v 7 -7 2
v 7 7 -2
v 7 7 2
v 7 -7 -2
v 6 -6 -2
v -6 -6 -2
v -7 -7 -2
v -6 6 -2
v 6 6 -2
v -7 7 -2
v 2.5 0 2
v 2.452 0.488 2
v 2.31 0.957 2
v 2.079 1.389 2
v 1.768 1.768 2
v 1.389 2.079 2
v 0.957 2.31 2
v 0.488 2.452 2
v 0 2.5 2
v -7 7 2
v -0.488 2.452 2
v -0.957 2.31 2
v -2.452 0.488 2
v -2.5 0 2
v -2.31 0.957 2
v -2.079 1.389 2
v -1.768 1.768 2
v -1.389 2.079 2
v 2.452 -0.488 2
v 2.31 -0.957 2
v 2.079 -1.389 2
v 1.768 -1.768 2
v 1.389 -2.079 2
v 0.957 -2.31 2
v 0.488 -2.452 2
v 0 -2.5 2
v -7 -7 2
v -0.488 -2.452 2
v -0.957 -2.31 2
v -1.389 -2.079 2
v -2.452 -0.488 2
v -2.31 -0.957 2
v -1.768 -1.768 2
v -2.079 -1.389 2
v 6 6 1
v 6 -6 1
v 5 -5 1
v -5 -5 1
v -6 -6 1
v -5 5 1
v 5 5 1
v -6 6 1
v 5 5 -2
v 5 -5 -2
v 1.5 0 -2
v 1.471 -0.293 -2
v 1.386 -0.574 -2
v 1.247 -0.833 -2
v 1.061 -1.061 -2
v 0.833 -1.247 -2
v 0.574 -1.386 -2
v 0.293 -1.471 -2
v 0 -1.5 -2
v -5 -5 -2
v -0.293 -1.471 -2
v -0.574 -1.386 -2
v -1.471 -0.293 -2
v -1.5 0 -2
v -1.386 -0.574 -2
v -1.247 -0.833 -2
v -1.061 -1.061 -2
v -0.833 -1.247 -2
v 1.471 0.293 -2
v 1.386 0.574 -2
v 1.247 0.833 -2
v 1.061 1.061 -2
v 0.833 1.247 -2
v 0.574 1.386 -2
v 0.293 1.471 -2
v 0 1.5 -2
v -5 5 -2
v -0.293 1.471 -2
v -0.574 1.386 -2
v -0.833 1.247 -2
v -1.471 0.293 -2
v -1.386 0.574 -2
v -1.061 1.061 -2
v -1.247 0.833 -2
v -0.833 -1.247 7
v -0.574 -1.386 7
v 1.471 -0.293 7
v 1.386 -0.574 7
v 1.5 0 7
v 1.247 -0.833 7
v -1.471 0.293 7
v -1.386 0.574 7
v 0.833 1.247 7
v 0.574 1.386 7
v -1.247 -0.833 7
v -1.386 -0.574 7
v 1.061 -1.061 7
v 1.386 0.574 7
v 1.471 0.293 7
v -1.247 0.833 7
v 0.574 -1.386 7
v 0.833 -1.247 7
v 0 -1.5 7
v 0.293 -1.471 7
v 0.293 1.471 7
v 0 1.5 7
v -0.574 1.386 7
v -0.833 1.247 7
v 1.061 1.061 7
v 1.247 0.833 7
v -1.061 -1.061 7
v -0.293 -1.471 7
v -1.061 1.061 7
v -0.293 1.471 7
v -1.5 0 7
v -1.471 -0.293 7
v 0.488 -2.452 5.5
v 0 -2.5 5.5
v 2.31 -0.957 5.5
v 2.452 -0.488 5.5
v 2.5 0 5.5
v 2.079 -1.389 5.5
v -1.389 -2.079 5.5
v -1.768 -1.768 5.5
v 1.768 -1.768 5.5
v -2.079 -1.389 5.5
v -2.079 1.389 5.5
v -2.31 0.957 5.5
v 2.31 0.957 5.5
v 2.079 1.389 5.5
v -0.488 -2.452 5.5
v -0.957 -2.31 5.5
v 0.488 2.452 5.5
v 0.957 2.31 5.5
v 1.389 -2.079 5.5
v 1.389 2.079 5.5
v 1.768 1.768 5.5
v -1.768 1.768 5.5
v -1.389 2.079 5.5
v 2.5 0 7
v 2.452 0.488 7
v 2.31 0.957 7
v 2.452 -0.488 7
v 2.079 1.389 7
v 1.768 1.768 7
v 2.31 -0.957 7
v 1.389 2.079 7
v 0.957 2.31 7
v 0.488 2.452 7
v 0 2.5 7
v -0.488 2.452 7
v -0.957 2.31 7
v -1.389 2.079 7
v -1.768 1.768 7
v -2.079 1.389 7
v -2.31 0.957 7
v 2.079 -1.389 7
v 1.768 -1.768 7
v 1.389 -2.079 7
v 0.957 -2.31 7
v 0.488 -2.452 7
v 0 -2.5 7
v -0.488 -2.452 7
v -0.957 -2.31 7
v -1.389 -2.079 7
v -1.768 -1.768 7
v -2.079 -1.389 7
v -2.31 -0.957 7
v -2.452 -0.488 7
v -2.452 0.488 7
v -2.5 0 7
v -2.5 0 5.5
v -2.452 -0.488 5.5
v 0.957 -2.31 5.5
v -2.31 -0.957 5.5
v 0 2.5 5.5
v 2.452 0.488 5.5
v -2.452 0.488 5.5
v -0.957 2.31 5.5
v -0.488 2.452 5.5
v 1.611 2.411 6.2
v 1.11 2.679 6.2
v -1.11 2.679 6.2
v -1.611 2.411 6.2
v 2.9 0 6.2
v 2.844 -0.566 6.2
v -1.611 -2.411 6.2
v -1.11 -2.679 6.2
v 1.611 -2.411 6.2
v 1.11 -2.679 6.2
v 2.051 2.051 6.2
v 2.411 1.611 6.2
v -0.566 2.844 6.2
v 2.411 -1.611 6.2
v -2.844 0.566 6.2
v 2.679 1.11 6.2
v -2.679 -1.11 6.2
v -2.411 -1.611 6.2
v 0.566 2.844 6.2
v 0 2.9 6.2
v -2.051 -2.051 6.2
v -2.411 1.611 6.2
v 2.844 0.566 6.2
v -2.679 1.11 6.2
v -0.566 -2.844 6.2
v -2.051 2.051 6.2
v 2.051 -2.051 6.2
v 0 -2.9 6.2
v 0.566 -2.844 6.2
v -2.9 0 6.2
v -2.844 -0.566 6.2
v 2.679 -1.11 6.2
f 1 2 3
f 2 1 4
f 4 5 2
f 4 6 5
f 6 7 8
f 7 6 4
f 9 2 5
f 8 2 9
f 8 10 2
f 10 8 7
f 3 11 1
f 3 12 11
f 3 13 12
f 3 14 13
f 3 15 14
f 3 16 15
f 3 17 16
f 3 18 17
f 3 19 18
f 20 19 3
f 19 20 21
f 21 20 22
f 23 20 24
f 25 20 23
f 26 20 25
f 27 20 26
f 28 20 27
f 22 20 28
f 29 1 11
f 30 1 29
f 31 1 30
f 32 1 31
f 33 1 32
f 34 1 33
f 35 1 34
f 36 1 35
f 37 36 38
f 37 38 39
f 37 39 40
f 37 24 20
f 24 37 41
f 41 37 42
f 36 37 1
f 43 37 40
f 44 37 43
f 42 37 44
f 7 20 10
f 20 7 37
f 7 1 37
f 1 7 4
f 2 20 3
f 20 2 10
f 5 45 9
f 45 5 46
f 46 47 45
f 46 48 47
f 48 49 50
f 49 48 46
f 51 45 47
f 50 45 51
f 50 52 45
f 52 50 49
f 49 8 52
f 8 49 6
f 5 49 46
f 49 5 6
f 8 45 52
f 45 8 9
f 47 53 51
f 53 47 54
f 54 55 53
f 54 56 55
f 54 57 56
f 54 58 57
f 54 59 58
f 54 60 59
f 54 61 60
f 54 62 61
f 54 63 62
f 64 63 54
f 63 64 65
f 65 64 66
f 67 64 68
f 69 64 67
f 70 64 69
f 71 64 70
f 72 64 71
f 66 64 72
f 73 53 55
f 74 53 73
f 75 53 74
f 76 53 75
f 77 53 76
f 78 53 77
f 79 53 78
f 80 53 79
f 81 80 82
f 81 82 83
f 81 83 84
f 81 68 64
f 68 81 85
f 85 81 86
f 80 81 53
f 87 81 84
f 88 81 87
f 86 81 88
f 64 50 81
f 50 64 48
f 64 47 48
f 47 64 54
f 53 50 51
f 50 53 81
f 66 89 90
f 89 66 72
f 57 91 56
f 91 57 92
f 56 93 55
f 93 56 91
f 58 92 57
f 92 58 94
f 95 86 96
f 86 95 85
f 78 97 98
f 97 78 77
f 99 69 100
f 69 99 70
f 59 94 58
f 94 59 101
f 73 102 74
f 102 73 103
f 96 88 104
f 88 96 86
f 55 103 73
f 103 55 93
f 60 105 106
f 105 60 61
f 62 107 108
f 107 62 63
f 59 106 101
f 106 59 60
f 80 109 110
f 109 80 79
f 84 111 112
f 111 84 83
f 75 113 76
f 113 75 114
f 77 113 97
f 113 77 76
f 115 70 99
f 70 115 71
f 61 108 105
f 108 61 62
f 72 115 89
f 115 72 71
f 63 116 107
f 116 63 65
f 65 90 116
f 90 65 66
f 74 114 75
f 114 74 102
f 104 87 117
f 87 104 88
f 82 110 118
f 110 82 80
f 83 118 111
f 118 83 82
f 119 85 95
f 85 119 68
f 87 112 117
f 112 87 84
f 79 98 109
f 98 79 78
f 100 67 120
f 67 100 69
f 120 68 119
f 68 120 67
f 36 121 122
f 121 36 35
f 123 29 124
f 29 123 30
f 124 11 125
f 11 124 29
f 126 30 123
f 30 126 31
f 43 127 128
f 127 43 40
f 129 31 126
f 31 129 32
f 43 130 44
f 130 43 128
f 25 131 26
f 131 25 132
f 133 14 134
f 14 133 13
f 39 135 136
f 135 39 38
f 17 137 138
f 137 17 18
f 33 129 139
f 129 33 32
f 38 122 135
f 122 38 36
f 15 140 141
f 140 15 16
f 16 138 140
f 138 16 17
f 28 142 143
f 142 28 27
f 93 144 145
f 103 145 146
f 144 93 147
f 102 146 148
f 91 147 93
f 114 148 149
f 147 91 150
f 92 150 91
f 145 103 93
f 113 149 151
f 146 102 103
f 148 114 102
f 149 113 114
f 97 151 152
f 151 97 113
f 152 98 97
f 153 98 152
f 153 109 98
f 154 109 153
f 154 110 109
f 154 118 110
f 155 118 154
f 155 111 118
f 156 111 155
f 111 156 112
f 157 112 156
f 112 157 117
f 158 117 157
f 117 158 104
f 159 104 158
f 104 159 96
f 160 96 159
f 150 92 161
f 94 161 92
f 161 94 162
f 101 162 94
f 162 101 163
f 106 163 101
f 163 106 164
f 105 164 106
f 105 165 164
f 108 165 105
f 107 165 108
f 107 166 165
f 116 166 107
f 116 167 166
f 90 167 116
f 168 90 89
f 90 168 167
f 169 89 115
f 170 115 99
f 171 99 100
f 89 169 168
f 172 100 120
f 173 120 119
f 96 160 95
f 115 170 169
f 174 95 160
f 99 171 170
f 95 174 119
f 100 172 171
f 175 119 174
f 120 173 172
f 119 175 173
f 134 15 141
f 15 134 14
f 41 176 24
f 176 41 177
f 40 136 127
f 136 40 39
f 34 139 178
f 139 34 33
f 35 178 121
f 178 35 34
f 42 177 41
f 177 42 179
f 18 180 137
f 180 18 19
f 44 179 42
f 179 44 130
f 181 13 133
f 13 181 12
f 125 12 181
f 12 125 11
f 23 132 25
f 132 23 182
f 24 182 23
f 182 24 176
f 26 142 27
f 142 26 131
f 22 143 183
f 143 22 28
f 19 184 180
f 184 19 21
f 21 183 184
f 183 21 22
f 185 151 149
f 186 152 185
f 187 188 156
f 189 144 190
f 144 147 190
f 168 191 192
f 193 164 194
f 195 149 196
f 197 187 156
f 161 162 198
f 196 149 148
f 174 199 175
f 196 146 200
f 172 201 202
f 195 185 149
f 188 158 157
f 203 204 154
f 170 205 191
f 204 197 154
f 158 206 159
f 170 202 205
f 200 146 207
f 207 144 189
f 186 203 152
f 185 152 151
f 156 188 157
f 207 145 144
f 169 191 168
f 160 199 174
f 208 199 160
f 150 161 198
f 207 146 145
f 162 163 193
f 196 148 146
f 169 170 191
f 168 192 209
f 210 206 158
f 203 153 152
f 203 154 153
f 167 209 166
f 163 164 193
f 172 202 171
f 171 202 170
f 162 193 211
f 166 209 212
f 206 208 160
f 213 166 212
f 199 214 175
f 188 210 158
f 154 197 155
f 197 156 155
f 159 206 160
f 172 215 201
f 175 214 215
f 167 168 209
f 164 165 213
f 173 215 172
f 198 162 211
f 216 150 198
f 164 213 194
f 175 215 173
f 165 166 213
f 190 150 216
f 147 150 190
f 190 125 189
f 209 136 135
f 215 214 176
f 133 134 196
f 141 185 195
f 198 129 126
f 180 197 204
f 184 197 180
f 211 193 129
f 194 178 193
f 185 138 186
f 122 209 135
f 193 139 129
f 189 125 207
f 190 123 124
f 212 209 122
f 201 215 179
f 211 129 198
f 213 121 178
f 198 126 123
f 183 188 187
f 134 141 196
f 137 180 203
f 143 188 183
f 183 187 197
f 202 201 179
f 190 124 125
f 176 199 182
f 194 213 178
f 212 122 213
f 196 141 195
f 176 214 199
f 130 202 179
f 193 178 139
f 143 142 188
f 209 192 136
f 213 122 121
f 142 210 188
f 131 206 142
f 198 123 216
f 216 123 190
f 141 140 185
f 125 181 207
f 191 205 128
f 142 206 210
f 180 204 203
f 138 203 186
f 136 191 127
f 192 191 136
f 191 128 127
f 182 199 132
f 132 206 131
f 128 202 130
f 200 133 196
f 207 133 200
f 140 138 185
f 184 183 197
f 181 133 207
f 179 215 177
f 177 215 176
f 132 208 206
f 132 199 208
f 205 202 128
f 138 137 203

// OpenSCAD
module cap(d,t) {
  difference() {
      cube([d+t,d+t,t],center=true);
      translate([0,0,2])
       cube([d+2,d+2,t+2],center=true);
  }
  cube([d,d,t],center=true);
}

module tube(bore, off) {// luer connection
 $fn=32;
 Rin=0.75;
 Rout=1.25;
 big = 2.9;
 lil = 2.5;

 difference(){
	union(){
		translate([0,0,-off]) cylinder(r=lil,h=6);
		translate([0,0,-off]) cylinder(r1=lil,r2=big,h=0.8);
            translate([0,0,-off+0.8]) cylinder(r1=big,r2=lil,h=0.7);
	}
	//inside
	translate([0,0,-off-0.1]) cylinder(r=bore,h=7);
	translate([0,0,-5.1]) cylinder(r1=bore,r2=Rin,h=5.2);

 }
}


module flow(d,t,rad) {
    difference() {
          cap(d,t);
          cylinder(r=rad,h=2*t,center=true,$fn=32);
    }
   tube(rad,7);
}

//cap(10,4);
rotate([180,0,0]) flow(10,4,1.5);
